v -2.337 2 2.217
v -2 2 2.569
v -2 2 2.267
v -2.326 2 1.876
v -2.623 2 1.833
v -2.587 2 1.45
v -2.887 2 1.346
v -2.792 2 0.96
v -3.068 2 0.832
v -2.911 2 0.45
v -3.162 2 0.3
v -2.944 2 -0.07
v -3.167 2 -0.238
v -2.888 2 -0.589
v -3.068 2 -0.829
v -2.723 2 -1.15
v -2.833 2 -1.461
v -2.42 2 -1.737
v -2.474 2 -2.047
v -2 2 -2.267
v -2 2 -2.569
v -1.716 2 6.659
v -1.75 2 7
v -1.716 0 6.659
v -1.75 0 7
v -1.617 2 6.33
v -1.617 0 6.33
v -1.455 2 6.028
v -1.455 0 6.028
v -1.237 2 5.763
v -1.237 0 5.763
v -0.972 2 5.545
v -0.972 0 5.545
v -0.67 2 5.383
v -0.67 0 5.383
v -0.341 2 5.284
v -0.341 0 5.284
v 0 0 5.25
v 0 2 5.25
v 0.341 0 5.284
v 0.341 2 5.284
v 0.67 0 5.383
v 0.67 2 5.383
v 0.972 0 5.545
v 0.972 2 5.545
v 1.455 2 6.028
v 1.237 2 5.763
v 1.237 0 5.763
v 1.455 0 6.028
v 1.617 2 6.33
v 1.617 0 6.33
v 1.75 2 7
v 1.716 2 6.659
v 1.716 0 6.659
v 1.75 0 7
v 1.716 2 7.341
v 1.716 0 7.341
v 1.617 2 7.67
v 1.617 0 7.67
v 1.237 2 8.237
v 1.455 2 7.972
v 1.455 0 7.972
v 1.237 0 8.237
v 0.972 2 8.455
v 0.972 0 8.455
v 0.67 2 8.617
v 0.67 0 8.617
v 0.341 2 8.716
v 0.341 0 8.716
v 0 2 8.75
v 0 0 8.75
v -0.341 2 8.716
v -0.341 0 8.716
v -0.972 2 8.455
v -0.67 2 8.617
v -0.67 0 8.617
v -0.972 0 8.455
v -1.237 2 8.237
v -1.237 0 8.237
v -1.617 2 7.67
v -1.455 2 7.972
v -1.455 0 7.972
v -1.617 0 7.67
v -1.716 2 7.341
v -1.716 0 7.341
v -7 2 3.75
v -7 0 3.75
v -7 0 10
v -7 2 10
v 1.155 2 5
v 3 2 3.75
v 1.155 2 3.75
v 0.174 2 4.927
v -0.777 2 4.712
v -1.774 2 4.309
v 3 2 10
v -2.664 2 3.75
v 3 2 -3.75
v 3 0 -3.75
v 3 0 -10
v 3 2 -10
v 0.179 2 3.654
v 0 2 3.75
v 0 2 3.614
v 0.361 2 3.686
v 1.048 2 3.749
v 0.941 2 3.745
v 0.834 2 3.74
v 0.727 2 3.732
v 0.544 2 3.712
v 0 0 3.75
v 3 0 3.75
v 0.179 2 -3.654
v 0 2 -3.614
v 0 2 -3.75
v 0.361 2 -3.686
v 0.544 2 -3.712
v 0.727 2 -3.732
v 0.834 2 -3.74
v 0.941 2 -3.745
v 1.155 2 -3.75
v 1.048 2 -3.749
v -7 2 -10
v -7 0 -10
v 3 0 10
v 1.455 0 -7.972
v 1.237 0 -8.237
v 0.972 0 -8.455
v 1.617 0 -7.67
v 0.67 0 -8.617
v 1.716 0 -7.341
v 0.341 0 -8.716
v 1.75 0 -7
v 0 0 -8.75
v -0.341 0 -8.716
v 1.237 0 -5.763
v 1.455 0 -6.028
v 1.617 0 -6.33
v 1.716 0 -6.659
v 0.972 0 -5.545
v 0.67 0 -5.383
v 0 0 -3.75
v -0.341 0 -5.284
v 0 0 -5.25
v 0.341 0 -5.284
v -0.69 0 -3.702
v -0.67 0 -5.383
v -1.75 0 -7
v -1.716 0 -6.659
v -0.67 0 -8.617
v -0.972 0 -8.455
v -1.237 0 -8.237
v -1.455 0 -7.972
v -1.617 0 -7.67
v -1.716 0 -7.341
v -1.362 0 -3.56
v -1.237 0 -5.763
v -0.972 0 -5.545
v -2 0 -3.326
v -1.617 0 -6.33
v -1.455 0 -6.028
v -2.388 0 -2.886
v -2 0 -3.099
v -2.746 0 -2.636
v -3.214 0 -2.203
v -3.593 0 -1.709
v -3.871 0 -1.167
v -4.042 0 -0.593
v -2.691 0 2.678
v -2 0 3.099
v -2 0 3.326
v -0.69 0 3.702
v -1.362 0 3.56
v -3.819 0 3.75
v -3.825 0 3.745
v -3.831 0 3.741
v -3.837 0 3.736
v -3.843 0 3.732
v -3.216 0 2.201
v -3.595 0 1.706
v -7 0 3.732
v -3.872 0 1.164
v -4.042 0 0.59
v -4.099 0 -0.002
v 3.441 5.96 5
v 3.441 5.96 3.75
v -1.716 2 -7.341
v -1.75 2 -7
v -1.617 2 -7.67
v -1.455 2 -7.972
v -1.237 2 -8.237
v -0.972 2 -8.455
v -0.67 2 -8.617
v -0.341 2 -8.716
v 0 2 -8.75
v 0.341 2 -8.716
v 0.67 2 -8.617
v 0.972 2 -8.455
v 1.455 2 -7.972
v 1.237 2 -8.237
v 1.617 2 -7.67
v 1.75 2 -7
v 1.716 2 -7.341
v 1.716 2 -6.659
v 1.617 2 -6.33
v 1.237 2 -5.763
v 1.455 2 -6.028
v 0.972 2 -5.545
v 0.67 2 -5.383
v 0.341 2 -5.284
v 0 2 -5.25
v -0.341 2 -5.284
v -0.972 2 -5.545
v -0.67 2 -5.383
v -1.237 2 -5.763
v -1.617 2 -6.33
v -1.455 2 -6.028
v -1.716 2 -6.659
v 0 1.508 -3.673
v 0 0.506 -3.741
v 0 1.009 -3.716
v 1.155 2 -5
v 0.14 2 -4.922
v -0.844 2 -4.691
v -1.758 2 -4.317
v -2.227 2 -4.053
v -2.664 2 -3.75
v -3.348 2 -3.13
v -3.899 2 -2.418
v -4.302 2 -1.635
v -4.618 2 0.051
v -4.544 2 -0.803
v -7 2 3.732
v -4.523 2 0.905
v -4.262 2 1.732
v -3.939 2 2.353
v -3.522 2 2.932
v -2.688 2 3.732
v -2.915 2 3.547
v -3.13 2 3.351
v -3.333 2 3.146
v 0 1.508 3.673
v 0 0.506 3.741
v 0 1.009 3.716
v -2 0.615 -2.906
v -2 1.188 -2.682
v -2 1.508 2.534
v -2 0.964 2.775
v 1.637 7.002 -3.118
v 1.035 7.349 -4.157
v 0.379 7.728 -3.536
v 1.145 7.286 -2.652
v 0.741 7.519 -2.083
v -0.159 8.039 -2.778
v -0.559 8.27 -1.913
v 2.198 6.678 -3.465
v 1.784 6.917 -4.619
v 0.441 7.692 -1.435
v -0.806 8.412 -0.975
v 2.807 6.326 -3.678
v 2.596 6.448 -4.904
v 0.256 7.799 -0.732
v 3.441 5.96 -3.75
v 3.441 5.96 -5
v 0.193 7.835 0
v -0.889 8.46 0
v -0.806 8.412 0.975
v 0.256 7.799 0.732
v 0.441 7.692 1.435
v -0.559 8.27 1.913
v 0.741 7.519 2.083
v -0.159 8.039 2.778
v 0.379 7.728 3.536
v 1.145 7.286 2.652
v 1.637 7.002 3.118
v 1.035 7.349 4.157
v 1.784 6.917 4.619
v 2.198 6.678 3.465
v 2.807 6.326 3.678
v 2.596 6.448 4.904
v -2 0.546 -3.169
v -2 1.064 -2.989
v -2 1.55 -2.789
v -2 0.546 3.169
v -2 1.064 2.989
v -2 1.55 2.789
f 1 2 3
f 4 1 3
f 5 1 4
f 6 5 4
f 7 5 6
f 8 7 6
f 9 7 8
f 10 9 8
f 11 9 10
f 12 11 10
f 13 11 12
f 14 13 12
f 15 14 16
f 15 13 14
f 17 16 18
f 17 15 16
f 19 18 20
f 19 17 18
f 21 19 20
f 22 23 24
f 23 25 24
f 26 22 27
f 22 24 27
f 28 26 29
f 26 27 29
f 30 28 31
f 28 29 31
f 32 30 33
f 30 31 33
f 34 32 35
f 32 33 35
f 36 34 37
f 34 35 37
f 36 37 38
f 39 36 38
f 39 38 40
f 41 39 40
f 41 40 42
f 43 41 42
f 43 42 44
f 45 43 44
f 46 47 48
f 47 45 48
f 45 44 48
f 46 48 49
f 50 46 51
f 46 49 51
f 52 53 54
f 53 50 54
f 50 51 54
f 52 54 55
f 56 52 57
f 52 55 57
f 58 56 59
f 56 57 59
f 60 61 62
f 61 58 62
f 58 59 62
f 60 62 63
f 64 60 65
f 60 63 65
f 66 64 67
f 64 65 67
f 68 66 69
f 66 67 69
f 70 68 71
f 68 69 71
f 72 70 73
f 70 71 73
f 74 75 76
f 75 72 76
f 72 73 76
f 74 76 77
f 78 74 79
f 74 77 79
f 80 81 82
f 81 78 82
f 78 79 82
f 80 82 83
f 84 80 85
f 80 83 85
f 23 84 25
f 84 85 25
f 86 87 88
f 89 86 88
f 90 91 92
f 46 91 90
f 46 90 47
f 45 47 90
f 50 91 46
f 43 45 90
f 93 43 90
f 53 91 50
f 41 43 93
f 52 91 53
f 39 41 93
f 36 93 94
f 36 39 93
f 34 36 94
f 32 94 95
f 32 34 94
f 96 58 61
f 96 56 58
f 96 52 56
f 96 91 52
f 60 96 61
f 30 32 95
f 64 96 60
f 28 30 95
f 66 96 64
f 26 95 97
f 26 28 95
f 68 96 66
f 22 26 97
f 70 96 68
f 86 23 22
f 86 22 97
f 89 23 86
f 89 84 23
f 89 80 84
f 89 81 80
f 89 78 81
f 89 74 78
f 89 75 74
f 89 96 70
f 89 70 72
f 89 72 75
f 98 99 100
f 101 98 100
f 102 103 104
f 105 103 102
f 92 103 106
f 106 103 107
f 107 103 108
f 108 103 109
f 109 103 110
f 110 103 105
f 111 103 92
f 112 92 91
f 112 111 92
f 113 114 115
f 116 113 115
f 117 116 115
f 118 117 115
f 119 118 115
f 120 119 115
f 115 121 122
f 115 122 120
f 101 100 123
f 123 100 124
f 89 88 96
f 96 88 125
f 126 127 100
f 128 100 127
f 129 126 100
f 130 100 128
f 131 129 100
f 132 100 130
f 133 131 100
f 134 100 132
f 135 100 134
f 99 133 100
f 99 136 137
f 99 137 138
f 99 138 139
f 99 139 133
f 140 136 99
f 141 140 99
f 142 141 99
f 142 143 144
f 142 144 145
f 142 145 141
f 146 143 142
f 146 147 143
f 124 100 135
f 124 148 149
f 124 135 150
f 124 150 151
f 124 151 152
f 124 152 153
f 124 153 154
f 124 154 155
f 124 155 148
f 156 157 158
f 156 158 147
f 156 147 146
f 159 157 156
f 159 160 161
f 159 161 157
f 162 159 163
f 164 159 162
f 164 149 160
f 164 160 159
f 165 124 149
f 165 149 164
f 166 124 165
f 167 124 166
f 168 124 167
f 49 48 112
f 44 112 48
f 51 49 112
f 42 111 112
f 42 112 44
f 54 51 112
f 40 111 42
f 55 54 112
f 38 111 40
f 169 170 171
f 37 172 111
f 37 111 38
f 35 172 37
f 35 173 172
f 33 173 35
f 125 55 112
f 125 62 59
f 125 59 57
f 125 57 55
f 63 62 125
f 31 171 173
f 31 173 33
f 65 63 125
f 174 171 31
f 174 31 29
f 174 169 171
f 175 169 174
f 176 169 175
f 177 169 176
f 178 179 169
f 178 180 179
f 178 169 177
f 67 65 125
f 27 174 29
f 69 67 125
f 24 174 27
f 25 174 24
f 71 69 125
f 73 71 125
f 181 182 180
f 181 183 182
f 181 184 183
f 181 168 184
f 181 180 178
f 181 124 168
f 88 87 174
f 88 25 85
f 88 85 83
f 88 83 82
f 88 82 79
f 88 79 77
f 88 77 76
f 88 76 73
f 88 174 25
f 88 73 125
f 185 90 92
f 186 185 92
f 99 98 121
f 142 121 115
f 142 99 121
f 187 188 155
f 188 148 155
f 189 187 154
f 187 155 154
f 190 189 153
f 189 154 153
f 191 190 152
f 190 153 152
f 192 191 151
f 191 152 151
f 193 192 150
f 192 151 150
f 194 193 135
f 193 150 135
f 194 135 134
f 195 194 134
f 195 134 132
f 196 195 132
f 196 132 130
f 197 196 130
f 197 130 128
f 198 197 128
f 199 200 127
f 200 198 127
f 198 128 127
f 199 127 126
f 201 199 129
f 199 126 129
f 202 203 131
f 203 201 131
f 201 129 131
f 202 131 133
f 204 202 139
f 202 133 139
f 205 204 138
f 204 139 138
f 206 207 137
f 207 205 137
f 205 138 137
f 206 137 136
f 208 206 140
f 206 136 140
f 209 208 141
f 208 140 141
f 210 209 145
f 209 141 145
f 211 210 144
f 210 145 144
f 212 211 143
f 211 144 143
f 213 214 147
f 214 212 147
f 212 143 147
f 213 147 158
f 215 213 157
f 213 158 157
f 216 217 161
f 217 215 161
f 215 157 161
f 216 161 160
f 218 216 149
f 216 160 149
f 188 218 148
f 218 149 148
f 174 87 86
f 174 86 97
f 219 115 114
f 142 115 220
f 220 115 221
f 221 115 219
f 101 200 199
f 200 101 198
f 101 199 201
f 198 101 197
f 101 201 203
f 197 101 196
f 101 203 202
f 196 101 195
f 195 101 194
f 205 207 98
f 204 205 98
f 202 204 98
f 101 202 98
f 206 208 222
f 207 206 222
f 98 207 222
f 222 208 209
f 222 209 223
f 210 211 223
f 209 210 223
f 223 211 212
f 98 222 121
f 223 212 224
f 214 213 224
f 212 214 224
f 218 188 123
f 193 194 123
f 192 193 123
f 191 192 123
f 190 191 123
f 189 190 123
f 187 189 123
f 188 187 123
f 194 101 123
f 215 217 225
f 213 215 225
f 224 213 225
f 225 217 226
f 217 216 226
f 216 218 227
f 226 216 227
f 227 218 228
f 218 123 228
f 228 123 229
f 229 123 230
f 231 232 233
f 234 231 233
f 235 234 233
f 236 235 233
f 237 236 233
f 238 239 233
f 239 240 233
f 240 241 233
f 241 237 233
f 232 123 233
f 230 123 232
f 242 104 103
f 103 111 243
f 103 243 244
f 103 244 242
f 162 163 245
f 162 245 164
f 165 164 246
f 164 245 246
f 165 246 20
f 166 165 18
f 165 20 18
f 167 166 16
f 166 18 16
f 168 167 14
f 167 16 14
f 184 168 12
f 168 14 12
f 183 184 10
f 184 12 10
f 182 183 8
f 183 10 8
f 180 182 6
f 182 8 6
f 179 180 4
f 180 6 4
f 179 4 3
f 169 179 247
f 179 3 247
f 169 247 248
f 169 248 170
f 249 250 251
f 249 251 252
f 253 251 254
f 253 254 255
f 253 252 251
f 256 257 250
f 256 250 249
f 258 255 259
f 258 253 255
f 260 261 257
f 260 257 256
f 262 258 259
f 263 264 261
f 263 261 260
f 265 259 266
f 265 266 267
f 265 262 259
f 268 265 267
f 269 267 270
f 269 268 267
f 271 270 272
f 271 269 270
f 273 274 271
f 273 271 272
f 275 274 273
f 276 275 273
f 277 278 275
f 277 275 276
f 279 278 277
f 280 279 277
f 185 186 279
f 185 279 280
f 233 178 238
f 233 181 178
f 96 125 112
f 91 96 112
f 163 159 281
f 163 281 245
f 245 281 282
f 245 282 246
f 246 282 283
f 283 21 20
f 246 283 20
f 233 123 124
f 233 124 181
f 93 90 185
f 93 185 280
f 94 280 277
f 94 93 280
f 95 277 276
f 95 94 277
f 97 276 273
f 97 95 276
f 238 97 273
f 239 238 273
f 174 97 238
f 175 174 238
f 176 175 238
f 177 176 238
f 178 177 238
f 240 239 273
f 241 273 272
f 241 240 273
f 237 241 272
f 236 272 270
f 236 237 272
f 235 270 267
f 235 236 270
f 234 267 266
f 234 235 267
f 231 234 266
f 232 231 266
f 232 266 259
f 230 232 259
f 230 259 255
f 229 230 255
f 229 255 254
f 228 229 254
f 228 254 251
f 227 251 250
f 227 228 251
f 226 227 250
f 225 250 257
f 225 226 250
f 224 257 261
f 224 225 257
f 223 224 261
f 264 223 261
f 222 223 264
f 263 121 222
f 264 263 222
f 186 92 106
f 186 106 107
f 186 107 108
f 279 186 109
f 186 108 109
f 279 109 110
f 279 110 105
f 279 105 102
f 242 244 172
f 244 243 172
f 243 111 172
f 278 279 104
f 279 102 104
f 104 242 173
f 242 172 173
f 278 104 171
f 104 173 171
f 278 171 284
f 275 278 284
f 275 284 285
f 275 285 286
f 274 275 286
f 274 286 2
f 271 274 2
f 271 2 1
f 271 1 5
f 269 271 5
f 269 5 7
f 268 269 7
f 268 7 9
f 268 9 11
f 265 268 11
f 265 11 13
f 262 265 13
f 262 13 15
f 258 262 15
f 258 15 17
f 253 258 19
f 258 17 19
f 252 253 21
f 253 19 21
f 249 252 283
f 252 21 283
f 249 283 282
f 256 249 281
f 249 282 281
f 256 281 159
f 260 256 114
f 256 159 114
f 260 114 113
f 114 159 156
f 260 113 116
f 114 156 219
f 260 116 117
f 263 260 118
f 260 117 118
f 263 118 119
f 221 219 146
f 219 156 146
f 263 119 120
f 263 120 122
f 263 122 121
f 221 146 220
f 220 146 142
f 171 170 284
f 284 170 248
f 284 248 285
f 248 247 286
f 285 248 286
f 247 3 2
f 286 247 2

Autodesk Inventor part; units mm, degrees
ref_plane "YZ Plane" through (0, 0, 0) normal (1, 0, 0) x (0, 1, 0)
ref_plane "XZ Plane" through (0, 0, 0) normal (0, 1, 0) x (-1, 0, 0)
ref_plane "XY Plane" through (0, 0, 0) normal (0, 0, 1) x (1, 0, 0)
sketch "Sketch1" plane through (0, 0, 0) normal (0, 1, 0) x (-1, 0, 0)
  circle A0 centre (0, 7) radius 1.75
  circle A1 centre (0, -7) radius 1.75
  line L0 (7, 10) -> (-3, 10)
  line L1 (-3, 10) -> (-3, -10)
  line L2 (-3, -10) -> (7, -10)
  line L3 (7, -10) -> (7, 10)
  line L4 (7, 3.75) -> (-0.3, 3.75)
  line L5 (-0.3, 3.75) -> (-0.3, -3.75)
  line L6 (-0.3, -3.75) -> (7, -3.75)
  line L7 (7, -3.75) -> (7, 3.75)
  point P0 (0, 0)
  dimension "d0" = 3.5
  dimension "d1" = 3.5
  dimension "d2" = 0
  dimension "d3" = 0
  dimension "d4" = 14
  dimension "d5" = 7
  dimension "d6" = 3
  dimension "d7" = 3
  dimension "d8" = 3
  dimension "d9" = 10
  dimension "d10" = 7.5
  dimension "d11" = 3.75
  dimension "d12" = 0.3
extrude "Extrusion1" add sketch "Sketch1" along normal blind 2 contours L3 L4 L5 L6 L2 L1 L0
ref_plane "Work Plane1" through (0.3, 2, -3.75) normal (0.5, 0.866, 0) x (0, 0, 1)
sketch "Sketch2" plane through (0.3, 2, -3.75) normal (0.5, 0.866, 0) x (0, 0, 1)
  line L0 (0, 0) -> (7.5, 0) projected
  circle A0 centre (3.75, 0) radius 3.75
  point P0 (3.75, 0.7402)
  dimension "d16" = 7.5
extrude "Extrusion2" cut sketch "Sketch2" along normal through all both and the other way through all
sketch "Sketch3" plane through (0.3, 2, -3.75) normal (0.5, 0.866, 0) x (0, 0, 1)
  circle A0 centre (3.75, 0.7402) radius 3.75
  circle A1 centre (3.75, 0.7402) radius 5
  line L0 (8.75, 0.7402) -> (-1.25, 0.7402)
  point P0 (7.5, 0.7402)
  point P1 (0, 0.7402)
  dimension "d19" = 7.5
  dimension "d20" = 10
extrude "Extrusion3" add sketch "Sketch3" along normal mid plane 10 contours L0 A1 A0 picked at (8.2486, 0.0422)
sketch "Sketch4" plane through (-7, 0, -10) normal (-1, 0, 0) x (0, 0, 1)
  line L0 (6.25, 0) -> (5, 0) projected
  line L1 (12.9317, 2) -> (13.7317, 2) projected
  line L2 (6.25, 0) -> (13.7317, 0)
  line L3 (13.7317, 0) -> (13.7317, 2)
  line L4 (13.7317, 2) -> (6.25, 2)
  line L5 (6.25, 2) -> (6.25, 0)
  point P0 (10, 0)
  point P1 (12.9317, 2)
extrude "Extrusion4" add sketch "Sketch4" against normal blind 5
sketch "Sketch5" plane through (-7, 0, 10) normal (0, 0, 1) x (1, 0, 0)
  line L0 (0, 0) -> (0, 2) projected
  line L1 (0, 0) -> (10, 0)
  line L2 (10, 0) -> (10, -5)
  line L3 (10, -5) -> (0, -5)
  line L4 (0, -5) -> (0, 0)
  point P0 (7, 0)
  dimension "d25" = 10
  dimension "d26" = 5
extrude "Extrusion5" cut sketch "Sketch5" against normal through all
sketch "Sketch6" plane through (0.3, 2, -3.75) normal (0.5, 0.866, 0) x (0, 0, 1)
  circle A0 centre (3.75, 0.7402) radius 3.55
  dimension "d29" = 7.1
extrude "Extrusion6" cut sketch "Sketch6" against normal through all
sketch "Sketch7" plane through (0, 0, 0) normal (0, -1, 0) x (1, 0, 0)
  ellipse E0 centre (0, 0) end of major axis (-4.3301, 0) minor radius 3.75 (0, 3.75) -> (0, -3.75) ccw projected
  line L0 (3, -2.9317) -> (3, -10) projected
  line L1 (0, 3.75) -> (3, 3.75)
  line L2 (3, 3.75) -> (3, -3.75)
  line L3 (3, -3.75) -> (0, -3.75)
  line L4 (0, -3.75) -> (0, 3.75)
  point P0 (0, 0)
  dimension "d32" = 7.5
extrude "Extrusion7" cut sketch "Sketch7" against normal up to surface (2 mm away) contours L1 L2 L0 L3 L4
equation "\"d11\" = 0.5 * d10"
properties part number "Front Bracket"
